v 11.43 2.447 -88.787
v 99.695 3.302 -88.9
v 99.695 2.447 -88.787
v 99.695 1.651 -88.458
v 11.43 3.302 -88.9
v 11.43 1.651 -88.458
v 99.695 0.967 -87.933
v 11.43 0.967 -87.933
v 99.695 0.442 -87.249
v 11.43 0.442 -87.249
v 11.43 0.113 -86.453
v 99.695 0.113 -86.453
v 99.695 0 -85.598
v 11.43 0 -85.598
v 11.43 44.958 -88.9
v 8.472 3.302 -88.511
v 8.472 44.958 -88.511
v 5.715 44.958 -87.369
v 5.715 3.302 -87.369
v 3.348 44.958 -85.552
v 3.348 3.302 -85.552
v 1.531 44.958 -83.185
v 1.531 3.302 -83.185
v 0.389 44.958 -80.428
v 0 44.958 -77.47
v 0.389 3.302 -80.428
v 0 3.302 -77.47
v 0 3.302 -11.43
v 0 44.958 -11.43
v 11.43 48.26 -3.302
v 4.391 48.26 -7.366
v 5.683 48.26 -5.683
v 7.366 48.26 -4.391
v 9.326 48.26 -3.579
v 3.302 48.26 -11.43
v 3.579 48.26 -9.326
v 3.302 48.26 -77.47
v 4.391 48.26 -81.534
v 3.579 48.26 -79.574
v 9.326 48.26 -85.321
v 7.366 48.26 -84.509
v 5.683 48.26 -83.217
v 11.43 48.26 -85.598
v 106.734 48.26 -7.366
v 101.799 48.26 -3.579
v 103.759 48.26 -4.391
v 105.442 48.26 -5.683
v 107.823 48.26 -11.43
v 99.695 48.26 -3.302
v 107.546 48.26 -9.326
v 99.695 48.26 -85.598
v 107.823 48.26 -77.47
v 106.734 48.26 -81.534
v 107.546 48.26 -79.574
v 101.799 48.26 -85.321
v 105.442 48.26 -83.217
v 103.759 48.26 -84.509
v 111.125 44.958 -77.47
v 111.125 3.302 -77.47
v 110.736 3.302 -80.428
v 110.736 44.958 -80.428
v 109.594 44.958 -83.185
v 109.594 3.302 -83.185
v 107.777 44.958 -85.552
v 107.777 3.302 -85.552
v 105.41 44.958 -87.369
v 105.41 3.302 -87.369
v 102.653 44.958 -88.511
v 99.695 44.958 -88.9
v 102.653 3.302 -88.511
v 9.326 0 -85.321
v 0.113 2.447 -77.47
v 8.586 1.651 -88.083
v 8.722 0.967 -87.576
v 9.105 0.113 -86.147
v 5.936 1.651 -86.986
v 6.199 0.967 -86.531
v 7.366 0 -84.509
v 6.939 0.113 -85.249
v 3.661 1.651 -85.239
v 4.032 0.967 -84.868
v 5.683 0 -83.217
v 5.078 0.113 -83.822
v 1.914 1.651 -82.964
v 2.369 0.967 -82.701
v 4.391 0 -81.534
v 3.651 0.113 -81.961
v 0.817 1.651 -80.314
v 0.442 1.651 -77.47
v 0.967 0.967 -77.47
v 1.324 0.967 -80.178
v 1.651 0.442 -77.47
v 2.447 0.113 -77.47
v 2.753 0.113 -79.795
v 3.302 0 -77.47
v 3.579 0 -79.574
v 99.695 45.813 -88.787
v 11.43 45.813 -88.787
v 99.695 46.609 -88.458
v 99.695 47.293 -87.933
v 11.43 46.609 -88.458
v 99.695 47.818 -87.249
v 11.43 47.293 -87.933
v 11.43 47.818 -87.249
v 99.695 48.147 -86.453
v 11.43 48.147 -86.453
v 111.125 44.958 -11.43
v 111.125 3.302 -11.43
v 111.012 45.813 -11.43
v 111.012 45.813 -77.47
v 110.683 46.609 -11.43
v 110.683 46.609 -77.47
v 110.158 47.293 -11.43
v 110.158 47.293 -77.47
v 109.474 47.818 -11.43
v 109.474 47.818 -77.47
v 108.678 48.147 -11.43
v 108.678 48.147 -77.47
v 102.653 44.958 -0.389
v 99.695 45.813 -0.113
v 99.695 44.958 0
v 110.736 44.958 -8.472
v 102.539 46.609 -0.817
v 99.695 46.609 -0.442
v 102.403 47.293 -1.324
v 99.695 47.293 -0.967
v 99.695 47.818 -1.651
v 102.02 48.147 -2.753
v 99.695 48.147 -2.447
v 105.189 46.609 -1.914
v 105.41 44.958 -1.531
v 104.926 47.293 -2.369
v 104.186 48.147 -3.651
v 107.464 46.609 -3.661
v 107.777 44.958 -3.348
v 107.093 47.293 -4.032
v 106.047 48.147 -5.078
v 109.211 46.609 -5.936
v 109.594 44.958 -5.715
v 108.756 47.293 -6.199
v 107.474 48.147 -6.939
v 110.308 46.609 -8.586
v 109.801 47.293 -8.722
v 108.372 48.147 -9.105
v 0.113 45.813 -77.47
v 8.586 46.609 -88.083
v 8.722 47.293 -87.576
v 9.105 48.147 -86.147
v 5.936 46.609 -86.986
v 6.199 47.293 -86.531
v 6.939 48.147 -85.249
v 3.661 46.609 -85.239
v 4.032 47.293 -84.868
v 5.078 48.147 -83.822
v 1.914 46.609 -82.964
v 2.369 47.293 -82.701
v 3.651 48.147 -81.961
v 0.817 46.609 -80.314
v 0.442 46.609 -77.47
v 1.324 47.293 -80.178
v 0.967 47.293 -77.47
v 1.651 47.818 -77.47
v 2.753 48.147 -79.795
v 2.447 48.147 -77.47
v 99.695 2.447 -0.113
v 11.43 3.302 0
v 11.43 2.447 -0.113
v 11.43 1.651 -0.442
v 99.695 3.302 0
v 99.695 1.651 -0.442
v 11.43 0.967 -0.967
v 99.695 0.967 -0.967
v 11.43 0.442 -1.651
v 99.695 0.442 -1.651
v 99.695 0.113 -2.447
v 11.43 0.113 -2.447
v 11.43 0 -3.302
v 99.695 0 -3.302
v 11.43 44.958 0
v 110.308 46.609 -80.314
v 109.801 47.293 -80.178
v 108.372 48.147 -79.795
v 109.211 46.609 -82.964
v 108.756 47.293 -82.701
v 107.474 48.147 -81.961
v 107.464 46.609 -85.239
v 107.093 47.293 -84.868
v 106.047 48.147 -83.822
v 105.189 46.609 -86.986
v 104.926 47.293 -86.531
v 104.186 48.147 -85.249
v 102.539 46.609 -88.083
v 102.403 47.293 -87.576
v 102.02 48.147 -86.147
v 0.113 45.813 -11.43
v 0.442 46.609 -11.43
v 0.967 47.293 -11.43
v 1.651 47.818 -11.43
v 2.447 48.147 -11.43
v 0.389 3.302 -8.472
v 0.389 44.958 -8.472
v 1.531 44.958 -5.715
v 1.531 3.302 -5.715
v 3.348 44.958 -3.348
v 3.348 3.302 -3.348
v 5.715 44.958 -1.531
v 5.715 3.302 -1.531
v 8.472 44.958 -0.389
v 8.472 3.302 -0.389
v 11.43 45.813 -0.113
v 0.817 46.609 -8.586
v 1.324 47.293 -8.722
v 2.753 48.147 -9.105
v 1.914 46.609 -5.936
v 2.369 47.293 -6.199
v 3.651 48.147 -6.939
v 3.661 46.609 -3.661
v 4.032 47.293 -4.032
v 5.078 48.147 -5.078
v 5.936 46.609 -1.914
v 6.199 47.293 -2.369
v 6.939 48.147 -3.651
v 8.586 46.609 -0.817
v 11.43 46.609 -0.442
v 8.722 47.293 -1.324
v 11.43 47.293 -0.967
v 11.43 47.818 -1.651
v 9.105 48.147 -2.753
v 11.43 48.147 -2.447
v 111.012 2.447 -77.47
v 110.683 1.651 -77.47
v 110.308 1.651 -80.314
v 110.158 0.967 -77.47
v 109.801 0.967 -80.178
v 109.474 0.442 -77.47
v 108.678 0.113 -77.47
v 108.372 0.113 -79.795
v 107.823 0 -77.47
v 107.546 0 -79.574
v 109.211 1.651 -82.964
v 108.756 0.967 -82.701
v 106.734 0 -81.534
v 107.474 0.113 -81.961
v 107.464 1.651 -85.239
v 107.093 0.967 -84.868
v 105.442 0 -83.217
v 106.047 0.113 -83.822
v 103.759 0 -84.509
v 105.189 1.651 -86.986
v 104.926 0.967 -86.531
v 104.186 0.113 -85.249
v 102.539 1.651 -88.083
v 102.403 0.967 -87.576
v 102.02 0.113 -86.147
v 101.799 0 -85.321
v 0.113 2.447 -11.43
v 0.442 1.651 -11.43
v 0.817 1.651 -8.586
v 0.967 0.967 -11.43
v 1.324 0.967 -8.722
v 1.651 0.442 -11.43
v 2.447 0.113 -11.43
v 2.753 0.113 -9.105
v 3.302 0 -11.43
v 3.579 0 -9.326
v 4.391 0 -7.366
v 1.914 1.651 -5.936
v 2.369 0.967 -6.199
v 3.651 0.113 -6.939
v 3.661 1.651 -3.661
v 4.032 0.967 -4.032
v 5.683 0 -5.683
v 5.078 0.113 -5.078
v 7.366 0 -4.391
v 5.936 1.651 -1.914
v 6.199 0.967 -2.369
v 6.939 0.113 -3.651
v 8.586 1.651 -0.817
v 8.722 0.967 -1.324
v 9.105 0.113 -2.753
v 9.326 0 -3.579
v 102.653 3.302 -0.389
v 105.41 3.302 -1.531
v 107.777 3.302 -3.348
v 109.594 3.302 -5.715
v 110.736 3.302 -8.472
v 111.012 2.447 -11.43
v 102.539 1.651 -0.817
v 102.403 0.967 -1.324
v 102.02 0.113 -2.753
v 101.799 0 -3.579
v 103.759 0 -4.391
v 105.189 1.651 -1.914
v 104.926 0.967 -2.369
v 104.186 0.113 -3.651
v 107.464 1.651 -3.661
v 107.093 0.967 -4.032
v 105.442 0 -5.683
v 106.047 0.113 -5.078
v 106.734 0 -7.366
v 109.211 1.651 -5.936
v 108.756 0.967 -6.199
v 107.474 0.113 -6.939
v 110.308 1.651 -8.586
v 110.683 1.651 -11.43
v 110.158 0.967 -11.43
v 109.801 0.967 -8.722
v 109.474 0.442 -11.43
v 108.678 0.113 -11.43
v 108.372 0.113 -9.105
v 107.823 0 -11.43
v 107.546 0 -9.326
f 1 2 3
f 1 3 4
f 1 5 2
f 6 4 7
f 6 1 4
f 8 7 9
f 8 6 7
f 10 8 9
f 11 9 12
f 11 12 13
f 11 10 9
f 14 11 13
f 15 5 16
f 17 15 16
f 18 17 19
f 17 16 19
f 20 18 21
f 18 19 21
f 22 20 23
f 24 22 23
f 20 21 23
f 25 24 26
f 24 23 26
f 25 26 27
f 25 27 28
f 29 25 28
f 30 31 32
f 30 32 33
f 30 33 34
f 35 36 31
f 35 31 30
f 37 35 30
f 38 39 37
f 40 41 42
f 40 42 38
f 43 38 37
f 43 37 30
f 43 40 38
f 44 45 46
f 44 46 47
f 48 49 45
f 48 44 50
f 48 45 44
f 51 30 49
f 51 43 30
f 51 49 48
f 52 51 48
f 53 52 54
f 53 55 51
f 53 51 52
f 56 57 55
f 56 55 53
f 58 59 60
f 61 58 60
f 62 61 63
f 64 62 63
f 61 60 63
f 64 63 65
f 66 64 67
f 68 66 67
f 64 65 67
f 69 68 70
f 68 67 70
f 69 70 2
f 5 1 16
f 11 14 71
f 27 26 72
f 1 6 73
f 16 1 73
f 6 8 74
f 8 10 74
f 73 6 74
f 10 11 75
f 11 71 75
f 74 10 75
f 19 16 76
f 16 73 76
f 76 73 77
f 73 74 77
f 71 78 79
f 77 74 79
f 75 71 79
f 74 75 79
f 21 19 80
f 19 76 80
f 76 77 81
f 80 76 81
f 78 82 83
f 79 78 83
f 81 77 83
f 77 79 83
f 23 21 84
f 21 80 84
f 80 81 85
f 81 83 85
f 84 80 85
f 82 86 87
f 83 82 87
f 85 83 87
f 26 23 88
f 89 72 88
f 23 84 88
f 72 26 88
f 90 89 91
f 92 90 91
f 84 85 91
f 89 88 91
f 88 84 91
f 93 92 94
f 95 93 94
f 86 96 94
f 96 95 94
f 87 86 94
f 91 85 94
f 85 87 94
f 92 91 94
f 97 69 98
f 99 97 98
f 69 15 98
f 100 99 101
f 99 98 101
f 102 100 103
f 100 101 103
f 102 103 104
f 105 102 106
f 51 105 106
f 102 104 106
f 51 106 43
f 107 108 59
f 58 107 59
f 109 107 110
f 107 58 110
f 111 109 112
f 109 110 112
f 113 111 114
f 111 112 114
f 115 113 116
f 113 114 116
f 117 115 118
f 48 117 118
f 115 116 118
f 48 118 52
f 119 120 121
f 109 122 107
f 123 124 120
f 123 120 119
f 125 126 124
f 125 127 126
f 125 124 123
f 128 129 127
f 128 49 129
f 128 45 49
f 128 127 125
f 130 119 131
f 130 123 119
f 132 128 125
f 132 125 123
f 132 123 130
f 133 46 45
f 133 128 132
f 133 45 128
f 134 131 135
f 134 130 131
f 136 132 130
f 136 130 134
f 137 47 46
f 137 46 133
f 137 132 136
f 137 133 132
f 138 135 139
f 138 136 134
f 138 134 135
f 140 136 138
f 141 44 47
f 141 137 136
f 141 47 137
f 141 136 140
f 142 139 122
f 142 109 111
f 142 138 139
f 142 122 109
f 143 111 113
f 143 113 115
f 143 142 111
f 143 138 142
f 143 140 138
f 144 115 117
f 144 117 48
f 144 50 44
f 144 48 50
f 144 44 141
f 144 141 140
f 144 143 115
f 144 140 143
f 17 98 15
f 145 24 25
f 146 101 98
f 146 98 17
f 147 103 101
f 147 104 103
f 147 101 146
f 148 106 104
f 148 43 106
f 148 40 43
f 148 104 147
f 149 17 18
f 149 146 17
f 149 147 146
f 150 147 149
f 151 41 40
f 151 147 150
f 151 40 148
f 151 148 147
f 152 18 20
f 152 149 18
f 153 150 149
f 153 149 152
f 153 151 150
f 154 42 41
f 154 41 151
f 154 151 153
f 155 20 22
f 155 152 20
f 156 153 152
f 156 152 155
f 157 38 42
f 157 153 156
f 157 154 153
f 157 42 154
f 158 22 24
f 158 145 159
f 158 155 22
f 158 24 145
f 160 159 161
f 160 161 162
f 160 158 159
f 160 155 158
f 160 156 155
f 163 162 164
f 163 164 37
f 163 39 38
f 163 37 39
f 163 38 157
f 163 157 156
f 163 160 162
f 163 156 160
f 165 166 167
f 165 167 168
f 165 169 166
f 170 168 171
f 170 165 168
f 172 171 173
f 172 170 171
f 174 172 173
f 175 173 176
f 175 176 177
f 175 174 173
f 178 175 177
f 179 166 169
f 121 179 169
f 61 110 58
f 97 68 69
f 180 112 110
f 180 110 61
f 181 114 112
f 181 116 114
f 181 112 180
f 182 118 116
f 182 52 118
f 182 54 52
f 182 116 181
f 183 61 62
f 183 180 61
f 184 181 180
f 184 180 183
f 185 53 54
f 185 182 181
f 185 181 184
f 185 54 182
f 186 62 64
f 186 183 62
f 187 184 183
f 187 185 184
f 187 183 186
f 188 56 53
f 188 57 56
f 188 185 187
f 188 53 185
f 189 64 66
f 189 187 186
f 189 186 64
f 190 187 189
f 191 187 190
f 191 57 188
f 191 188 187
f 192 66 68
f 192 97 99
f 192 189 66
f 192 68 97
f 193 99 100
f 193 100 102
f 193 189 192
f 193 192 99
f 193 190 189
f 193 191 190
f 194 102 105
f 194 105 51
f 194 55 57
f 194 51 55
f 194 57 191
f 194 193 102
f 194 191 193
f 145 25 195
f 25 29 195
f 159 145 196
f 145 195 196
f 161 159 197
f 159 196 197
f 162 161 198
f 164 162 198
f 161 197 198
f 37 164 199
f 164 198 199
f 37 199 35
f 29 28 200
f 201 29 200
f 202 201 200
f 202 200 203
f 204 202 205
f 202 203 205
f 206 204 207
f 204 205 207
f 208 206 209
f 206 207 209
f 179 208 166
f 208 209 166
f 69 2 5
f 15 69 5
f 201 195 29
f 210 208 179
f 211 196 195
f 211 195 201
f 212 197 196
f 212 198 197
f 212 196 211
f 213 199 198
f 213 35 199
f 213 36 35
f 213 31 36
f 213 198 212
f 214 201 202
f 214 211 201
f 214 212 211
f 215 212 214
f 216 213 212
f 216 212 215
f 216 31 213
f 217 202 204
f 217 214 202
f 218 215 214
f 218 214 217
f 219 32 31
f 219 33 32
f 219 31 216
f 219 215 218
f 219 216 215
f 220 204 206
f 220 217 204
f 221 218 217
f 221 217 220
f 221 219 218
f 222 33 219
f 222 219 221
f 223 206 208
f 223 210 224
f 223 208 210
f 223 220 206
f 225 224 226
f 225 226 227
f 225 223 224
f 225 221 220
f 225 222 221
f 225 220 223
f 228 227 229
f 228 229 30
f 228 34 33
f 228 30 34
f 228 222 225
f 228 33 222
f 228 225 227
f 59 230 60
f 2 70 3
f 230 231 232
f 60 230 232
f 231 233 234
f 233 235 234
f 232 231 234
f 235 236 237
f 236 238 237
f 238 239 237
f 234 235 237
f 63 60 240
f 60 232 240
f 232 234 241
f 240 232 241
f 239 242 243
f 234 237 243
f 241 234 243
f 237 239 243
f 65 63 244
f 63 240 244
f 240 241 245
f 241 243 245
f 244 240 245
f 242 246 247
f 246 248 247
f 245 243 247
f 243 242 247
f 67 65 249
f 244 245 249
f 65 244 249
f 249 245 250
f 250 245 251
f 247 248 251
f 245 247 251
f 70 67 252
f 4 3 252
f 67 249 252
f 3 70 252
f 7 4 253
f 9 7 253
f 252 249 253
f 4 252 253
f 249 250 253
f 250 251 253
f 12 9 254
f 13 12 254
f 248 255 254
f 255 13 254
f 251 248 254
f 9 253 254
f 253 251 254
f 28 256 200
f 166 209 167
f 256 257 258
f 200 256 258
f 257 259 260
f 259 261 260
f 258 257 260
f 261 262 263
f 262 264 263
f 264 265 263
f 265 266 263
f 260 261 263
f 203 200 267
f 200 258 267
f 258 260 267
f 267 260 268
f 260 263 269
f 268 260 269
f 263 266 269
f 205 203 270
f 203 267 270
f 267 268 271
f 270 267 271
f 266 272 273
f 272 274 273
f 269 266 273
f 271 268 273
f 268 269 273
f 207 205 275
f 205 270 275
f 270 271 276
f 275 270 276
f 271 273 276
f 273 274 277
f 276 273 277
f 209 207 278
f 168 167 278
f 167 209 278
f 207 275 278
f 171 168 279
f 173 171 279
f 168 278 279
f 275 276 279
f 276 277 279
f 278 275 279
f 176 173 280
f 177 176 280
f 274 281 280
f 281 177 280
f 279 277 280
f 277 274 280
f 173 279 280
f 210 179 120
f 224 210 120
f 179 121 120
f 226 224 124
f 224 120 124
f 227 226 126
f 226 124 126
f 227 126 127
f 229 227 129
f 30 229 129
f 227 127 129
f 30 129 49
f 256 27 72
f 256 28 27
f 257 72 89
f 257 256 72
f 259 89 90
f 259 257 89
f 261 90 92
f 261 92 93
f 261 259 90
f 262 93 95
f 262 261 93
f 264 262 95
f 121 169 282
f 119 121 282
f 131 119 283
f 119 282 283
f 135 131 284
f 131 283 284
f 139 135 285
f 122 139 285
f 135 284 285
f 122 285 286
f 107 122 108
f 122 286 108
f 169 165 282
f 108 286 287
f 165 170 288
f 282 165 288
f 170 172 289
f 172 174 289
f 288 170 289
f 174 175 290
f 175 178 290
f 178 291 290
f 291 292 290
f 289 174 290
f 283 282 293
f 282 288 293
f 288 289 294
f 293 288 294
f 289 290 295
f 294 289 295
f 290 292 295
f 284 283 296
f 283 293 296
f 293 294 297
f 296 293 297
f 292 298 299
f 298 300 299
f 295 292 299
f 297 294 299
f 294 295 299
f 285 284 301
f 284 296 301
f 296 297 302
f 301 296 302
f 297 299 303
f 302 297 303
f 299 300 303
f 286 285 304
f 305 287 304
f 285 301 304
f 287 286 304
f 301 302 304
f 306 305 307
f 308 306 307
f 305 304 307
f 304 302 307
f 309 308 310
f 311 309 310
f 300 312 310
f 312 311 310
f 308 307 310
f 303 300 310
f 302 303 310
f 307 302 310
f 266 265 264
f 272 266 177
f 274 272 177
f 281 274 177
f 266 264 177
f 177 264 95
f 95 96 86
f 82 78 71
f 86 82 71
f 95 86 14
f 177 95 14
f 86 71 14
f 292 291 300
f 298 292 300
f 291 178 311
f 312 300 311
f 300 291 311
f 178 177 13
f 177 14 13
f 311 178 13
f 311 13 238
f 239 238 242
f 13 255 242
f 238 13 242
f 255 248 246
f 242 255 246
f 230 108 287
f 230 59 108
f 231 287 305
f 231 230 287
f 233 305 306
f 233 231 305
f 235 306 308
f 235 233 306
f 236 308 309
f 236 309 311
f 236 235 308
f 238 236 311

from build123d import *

# Parameters (mm, degrees)
EXTRUDE1_DEPTH = 48.26
FILLET1_R      = 3.302


with BuildPart() as part:
    # Sketch2 → Extrude1 (new body)
    with BuildSketch(Plane(origin=(0, 0, 0), x_dir=(1, 0, 0), z_dir=(0, 1, 0))):
        with BuildLine():
            Line((11.43, 0), (99.695, 0))
            ThreePointArc((99.695, 0), (107.777230509, 3.347769491), (111.125, 11.43))
            Line((111.125, 11.43), (111.125, 77.47))
            ThreePointArc((111.125, 77.47), (107.777230509, 85.552230509), (99.695, 88.9))
            Line((99.695, 88.9), (11.43, 88.9))
            ThreePointArc((11.43, 88.9), (3.347769491, 85.552230509), (0, 77.47))
            Line((0, 77.47), (0, 11.43))
            ThreePointArc((0, 11.43), (3.347769491, 3.347769491), (11.43, 0))
        make_face()
    extrude(amount=EXTRUDE1_DEPTH)

    # Fillet1
    fillet1_edges = [part.edges().sort_by_distance(p)[0] for p in [
        (3.347769491, 48.26, -3.347769491),
        (0, 0, -44.45),
        (3.347769491, 0, -85.552230509),
        (55.5625, 48.26, 0),
        (107.777230509, 48.26, -3.347769491),
        (111.125, 48.26, -44.45),
        (107.777230509, 48.26, -85.552230509),
        (55.5625, 48.26, -88.9),
        (3.347769491, 48.26, -85.552230509),
        (0, 48.26, -44.45),
        (55.5625, 0, -88.9),
        (107.777230509, 0, -85.552230509),
        (111.125, 0, -44.45),
        (107.777230509, 0, -3.347769491),
        (55.5625, 0, 0),
        (3.347769491, 0, -3.347769491),
    ]]
    fillet(fillet1_edges, radius=FILLET1_R)


solid = part.part
